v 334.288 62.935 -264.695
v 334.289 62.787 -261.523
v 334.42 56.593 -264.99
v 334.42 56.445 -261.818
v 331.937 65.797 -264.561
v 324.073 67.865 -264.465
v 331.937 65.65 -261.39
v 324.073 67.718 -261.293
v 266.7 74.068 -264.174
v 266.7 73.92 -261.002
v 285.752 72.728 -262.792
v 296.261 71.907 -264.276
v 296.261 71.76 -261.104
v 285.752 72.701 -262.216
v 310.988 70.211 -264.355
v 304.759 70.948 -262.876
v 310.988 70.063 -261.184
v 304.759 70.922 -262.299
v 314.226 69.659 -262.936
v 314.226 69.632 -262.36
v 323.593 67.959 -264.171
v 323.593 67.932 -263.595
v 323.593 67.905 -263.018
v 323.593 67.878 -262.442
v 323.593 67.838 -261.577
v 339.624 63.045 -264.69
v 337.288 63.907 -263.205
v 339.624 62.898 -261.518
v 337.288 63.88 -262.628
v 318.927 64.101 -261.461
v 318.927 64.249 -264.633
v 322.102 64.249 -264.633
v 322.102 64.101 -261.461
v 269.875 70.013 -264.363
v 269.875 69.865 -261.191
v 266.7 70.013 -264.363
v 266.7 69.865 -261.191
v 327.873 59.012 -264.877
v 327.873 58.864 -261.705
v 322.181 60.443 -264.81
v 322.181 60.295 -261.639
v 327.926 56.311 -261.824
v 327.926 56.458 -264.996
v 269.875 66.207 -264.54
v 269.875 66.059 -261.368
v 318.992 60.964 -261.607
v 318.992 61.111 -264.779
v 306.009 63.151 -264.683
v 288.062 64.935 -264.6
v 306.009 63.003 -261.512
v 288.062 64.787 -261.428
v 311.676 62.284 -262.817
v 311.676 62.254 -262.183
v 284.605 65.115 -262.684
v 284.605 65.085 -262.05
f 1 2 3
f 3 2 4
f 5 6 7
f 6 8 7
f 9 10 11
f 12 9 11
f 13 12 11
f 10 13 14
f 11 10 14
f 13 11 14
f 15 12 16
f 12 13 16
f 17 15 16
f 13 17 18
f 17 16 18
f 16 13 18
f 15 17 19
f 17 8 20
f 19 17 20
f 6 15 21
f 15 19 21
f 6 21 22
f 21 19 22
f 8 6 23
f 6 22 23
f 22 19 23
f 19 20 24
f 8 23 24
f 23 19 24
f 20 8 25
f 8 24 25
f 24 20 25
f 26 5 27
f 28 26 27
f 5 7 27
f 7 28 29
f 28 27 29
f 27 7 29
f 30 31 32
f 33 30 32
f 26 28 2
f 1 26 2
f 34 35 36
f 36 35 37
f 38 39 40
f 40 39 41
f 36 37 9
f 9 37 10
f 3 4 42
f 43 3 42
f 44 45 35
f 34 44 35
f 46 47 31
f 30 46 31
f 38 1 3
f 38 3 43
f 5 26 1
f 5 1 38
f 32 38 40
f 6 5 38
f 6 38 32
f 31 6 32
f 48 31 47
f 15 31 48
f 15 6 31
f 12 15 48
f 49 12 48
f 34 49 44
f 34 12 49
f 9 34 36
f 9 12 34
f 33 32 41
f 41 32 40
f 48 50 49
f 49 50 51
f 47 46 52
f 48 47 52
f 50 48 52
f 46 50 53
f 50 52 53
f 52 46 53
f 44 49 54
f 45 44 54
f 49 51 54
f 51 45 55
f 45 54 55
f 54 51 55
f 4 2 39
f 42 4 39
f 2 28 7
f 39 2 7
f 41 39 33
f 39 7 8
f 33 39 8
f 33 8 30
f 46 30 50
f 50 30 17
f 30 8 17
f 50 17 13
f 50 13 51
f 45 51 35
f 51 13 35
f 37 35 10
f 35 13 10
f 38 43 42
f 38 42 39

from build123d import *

# Parameters (mm, degrees)
BOSS_EXTRUDE1_DEPTH = 3.175
CUT_EXTRUDE1_DEPTH  = 346.234988545


# Read off the part's stored shape, not the designer's step: Boss-Extrude1
with BuildPart() as part:
    # Boss-Extrude1 outline → Boss-Extrude1 (new body)
    with BuildSketch(Plane(origin=(-0.009916987, 12.278576214, -263.860866814), x_dir=(-0.9999999992952415, -1.714878770133331e-06, 3.750435023264405e-05), z_dir=(-3.75435237541071e-05, 0.046483980928917014, -0.998919034810872))):
        with BuildLine():
            Line((-266.709915303, 57.648462135), (-266.709915303, 61.708027896))
            add(Edge.make_bspline(
                [(-266.709915303, 61.708027896), (-269.887584881, 61.52219978), (-273.064168518, 61.324064977), (-279.4149918, 60.901231504), (-282.58925463, 60.676795587), (-288.934509574, 60.190857567), (-292.10551029, 59.929452947), (-298.442167613, 59.346080292), (-301.607816437, 59.024024058), (-306.349701907, 58.466282245), (-307.929227861, 58.267873545), (-311.085515829, 57.839733129), (-312.663293034, 57.609828162), (-317.381062315, 56.863266021), (-320.506696952, 56.290451051), (-326.699623135, 54.920620881), (-329.766751467, 54.122978484), (-334.305076589, 52.686850178), (-335.807423356, 52.168067082), (-338.042782442, 51.320103283), (-338.784874555, 51.025814321), (-339.560385157, 50.703827374), (-339.597042887, 50.688573106), (-339.633692836, 50.67328778)],
                knots=[0, 0, 0, 0, 0.125, 0.125, 0.25, 0.25, 0.375, 0.375, 0.5, 0.5, 0.5625, 0.5625, 0.625, 0.625, 0.75, 0.75, 0.875, 0.875, 0.9375, 0.9375, 0.96875, 0.96875, 0.970300764, 0.970300764, 0.970300764, 0.970300764], degree=3))
            Line((-339.633692836, 50.67328778), (-334.298424209, 50.562597429))
            Line((-334.298424209, 50.562597429), (-334.430138757, 44.213963618))
            Line((-334.430138757, 44.213963618), (-327.936177051, 44.079233964))
            Line((-327.936177051, 44.079233964), (-327.883140614, 46.635587248))
            add(Edge.make_bspline(
                [(-327.883140614, 46.635587248), (-325.438031692, 47.326829824), (-320.133269542, 48.598331676), (-311.722176056, 50.061031972), (-299.81281744, 51.590536041), (-285.844187499, 52.790641789), (-274.800669007, 53.536749827), (-269.884915303, 53.838462135)],
                knots=[0.134029376, 0.134029376, 0.134029376, 0.134029376, 0.242575191, 0.363862787, 0.485150382, 0.727725573, 0.92246236, 0.92246236, 0.92246236, 0.92246236], degree=3))
            Line((-269.884915303, 53.838462135), (-269.884915303, 57.648462135))
            Line((-269.884915303, 57.648462135), (-266.709915303, 57.648462135))
        make_face()
    extrude(amount=BOSS_EXTRUDE1_DEPTH)

    # Sketch2 → Cut-Extrude1 (cut, through all)
    with BuildSketch(Plane(origin=(-0.010036187, 12.426162855, -267.03243475), x_dir=(-0.9999999992952414, -1.7148787712879688e-06, 3.750435025948783e-05), z_dir=(-3.7543523780975545e-05, 0.04648398092854075, -0.9989190348108895))):
        Polygon((-322.111723269, 51.877927034), (-322.190769005, 48.067927034), (-319.017135046, 48.002083929), (-318.936723269, 51.877927034), align=None)
    extrude(amount=-CUT_EXTRUDE1_DEPTH, mode=Mode.SUBTRACT)


solid = part.part
